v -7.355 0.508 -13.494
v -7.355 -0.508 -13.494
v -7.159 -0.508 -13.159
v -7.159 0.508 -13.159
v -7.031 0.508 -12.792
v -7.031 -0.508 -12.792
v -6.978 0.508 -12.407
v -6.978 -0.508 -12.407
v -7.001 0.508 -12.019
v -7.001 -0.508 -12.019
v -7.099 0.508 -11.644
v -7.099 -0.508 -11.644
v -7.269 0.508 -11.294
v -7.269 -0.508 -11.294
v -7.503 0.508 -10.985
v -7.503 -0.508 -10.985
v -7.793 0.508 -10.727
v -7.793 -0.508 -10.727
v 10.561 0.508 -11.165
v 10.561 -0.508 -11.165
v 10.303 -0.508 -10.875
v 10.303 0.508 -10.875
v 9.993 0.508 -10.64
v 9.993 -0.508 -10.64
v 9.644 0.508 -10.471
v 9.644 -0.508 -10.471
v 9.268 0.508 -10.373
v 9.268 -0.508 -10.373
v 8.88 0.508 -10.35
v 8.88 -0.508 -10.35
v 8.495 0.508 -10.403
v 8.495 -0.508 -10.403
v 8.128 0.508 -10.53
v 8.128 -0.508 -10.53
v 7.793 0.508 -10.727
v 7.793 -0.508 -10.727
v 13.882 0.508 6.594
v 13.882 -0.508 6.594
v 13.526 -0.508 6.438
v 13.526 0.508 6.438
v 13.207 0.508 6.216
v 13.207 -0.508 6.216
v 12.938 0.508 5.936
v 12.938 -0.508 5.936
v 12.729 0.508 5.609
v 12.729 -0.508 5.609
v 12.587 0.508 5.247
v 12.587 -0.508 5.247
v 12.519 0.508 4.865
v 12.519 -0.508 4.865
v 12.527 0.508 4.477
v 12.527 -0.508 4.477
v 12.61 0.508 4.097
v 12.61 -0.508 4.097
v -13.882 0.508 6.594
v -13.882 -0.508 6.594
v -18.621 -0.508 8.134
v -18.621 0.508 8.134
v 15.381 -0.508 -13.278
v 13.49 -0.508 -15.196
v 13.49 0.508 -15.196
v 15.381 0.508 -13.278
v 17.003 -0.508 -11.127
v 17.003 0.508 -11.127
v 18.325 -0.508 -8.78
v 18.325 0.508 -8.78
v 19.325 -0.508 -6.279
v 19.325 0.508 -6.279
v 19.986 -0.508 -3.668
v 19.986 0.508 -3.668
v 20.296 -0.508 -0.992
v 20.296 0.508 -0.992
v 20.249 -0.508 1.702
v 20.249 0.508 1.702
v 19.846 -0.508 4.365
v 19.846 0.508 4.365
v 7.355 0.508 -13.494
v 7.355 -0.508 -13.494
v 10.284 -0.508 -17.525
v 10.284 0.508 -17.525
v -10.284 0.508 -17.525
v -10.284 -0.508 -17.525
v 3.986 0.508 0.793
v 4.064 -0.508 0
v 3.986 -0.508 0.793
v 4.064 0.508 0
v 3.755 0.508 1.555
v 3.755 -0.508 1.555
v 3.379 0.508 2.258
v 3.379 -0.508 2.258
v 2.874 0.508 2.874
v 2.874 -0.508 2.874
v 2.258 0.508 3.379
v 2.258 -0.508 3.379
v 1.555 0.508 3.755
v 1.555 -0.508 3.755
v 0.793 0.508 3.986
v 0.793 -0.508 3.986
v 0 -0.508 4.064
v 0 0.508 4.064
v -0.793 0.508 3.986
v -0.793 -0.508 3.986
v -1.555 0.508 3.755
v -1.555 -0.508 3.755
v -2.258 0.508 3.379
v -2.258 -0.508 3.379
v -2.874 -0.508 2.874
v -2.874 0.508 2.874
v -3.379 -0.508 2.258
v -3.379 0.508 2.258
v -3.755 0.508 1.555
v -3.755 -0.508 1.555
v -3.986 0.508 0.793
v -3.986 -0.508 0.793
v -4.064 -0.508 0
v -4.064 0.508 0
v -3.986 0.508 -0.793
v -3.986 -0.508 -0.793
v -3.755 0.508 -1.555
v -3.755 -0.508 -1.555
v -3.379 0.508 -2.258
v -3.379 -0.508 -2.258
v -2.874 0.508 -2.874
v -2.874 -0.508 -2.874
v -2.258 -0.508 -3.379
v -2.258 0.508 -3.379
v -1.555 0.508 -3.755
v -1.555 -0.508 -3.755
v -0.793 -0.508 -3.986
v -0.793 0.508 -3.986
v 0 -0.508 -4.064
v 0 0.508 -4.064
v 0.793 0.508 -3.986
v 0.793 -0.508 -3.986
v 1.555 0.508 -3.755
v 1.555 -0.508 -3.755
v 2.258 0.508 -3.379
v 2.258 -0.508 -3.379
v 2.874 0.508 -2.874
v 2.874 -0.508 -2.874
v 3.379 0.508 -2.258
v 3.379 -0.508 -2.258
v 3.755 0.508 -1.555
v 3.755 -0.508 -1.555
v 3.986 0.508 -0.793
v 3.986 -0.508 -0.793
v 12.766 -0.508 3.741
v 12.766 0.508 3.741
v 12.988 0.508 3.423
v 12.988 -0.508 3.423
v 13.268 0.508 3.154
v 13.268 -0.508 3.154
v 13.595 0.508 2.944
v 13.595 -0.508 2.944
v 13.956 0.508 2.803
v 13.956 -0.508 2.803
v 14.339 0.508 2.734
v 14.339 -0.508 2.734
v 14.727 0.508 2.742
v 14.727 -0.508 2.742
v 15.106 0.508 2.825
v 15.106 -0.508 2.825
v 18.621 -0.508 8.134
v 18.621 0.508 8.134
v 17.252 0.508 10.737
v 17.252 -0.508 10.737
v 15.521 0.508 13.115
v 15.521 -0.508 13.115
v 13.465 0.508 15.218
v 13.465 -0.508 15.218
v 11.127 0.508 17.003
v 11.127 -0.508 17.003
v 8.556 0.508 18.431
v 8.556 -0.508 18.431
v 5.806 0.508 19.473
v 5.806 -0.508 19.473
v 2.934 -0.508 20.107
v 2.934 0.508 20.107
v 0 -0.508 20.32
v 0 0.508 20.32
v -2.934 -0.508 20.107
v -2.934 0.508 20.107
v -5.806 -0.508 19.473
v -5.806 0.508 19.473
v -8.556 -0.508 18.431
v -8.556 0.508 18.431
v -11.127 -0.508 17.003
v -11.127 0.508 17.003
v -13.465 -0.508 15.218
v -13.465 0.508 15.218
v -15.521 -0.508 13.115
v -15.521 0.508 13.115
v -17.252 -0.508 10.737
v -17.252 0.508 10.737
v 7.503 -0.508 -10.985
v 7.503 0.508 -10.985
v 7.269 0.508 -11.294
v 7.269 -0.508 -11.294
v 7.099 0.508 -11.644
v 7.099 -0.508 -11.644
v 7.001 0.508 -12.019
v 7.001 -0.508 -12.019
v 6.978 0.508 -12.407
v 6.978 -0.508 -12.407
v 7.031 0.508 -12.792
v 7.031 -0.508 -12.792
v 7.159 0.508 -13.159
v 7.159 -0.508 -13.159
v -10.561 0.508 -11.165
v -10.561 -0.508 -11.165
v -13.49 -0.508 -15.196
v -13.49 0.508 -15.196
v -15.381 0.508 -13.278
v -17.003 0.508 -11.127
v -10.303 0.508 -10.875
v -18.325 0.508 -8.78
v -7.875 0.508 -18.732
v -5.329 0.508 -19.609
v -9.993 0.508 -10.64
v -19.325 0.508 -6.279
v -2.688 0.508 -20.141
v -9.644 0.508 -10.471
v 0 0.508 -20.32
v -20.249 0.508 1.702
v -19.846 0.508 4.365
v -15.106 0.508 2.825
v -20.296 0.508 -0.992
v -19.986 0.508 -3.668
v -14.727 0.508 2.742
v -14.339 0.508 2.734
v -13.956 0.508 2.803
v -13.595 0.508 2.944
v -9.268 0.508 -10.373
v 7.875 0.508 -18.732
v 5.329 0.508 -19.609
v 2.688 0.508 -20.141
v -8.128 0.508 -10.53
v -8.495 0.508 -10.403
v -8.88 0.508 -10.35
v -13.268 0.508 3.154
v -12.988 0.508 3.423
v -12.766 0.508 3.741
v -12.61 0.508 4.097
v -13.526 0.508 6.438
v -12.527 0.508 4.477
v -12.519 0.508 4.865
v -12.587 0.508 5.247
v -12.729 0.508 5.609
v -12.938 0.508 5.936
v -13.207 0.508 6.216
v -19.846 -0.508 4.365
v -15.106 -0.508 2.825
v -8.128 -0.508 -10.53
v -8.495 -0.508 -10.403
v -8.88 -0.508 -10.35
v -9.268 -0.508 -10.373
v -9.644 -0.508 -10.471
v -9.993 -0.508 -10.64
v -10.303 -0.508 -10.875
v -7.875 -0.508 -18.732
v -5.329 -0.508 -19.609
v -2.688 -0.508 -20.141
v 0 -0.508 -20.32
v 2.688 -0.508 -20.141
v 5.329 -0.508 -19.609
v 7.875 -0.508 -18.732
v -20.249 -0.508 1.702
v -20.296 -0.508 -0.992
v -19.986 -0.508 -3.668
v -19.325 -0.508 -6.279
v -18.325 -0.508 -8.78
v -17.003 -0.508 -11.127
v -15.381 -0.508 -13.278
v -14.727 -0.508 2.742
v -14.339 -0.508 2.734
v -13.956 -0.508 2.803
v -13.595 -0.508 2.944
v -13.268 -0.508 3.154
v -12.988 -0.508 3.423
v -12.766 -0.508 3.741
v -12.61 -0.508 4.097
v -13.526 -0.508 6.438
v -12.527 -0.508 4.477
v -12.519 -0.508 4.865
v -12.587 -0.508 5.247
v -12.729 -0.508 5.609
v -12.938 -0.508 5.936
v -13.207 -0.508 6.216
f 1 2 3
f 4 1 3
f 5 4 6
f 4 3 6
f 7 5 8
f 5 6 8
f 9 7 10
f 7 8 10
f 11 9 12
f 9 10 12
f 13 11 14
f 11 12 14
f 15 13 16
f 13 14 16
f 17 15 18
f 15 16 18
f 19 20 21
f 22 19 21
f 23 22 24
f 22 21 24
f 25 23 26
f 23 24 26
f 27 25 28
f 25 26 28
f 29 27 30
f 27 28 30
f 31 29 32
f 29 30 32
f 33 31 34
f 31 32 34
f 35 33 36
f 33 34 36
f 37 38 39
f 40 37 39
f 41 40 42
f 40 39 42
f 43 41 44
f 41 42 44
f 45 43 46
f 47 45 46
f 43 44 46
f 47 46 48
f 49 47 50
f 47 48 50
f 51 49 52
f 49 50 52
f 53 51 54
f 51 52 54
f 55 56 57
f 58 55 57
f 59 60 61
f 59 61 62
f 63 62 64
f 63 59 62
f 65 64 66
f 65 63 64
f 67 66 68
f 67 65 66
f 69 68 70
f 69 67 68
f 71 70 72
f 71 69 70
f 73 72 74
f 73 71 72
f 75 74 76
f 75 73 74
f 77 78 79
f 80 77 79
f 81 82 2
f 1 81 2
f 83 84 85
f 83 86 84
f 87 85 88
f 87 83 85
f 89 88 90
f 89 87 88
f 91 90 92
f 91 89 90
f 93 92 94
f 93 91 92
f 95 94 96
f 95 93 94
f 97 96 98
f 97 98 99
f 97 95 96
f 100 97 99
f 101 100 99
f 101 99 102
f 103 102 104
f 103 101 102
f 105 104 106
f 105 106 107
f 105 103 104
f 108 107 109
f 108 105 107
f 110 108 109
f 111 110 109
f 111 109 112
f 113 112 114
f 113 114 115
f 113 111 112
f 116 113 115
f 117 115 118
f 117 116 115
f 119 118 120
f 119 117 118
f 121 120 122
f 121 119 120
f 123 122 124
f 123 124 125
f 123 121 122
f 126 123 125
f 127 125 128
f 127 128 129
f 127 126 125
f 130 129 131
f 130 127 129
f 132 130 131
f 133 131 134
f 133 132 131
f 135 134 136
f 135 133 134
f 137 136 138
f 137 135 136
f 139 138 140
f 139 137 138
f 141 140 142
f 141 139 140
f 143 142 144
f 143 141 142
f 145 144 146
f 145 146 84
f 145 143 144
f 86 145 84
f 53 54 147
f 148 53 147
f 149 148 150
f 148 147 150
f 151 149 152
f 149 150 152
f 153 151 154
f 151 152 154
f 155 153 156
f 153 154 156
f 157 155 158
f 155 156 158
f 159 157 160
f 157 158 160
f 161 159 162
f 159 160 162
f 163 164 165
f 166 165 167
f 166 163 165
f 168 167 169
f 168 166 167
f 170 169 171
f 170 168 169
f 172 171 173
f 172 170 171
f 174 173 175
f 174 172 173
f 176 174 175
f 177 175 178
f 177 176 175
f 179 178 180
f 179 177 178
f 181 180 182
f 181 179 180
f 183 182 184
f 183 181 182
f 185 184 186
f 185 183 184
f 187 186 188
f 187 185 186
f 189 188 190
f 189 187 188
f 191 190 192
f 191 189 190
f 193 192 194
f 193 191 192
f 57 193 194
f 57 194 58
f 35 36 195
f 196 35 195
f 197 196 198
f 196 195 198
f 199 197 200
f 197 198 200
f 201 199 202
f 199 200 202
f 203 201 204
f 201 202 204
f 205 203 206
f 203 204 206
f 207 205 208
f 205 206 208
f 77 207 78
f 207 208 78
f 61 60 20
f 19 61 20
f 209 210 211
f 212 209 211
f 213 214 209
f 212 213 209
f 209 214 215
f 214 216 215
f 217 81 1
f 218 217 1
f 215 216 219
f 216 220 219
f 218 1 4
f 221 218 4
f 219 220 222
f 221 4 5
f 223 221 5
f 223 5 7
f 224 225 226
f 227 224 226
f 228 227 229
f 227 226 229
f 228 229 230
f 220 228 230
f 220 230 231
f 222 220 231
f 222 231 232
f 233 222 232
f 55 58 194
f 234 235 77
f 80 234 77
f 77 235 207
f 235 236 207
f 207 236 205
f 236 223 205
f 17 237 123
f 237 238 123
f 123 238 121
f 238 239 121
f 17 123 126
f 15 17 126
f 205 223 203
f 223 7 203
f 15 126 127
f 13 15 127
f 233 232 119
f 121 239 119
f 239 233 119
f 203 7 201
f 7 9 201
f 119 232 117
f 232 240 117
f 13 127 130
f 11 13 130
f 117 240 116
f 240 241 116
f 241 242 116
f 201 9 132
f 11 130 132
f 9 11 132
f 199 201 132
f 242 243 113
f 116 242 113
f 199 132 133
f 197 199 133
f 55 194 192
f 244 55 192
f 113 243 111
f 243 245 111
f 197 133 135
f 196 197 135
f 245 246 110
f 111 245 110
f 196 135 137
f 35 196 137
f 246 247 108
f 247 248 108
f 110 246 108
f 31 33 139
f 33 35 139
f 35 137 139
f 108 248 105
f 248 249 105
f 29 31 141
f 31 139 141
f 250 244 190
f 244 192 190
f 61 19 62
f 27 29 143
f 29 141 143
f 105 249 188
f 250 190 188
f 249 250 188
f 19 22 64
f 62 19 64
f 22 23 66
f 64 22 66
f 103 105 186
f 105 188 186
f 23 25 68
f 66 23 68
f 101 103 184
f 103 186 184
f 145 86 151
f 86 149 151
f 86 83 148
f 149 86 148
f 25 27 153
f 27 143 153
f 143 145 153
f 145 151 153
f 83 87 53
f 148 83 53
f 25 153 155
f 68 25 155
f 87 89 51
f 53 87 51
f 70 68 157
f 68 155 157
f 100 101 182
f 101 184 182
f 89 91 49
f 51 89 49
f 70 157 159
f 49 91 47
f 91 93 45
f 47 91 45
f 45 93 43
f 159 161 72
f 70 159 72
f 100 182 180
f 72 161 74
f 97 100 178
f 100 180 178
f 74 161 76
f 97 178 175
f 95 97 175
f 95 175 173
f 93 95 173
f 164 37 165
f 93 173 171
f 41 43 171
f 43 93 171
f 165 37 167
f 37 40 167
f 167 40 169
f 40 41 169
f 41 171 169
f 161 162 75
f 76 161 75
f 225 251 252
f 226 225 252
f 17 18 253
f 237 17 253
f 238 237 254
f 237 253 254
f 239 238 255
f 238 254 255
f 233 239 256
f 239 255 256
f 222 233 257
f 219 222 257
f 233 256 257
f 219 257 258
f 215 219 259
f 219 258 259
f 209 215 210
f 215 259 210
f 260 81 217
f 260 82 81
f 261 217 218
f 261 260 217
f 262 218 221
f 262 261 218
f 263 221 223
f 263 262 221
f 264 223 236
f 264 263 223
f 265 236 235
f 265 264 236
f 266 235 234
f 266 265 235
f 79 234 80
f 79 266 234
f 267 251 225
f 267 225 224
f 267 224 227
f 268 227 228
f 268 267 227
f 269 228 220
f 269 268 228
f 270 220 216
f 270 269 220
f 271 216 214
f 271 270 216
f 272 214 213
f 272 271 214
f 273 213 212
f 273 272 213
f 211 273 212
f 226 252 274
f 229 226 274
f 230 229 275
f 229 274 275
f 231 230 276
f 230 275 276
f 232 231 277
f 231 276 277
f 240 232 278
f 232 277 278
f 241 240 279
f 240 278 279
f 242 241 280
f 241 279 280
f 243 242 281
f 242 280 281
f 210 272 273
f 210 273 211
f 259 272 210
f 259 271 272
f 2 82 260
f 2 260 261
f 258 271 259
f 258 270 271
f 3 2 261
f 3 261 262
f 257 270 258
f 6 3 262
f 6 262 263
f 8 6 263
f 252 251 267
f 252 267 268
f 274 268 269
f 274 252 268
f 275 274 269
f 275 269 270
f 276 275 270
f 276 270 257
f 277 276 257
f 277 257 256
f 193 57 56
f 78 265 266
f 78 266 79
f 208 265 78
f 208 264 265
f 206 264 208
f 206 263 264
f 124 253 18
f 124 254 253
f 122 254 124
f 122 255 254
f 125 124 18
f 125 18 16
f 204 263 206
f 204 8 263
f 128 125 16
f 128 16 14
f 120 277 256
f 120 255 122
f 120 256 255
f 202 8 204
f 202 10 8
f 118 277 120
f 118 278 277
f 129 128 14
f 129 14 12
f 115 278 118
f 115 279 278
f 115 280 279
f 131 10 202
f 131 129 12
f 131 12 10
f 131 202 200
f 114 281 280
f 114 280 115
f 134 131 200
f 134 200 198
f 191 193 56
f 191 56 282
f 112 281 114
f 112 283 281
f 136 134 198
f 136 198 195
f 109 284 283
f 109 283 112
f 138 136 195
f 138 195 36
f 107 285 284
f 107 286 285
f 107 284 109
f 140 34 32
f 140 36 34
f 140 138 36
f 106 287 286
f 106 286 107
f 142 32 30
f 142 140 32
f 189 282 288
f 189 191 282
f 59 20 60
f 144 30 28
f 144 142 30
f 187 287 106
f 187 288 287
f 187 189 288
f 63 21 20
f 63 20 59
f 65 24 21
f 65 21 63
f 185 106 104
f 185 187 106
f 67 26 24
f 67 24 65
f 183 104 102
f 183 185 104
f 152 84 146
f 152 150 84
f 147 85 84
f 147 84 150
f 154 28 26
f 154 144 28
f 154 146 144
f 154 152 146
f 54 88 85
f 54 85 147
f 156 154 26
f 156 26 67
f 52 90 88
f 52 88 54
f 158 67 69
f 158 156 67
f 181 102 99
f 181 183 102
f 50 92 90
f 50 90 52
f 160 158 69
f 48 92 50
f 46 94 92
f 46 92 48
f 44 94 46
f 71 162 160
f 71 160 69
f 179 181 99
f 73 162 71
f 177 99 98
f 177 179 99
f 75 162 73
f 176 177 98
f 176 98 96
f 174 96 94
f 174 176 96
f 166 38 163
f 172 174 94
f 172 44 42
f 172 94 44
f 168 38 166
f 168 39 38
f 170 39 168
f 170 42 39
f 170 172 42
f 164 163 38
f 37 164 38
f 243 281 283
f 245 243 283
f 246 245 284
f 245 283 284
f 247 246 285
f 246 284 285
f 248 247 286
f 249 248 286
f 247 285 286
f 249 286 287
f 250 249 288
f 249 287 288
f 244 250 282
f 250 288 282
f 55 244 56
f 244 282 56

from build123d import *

# Parameters (mm, degrees)
F0_R     = 20.32
F0_R_2   = 4.064
F1_DEPTH = 0.508
F3_DEPTH = 25.4


with BuildPart() as f1:
    # F0 (on Front) → F1 (new body, symmetric)
    with BuildSketch(Plane.XZ):
        Circle(F0_R)
        Circle(F0_R_2, mode=Mode.SUBTRACT)
    extrude(amount=F1_DEPTH, both=True)

    # F2 (on face) → F3 (cut)
    with BuildSketch(Plane.XZ.offset(0.508)):
        with BuildLine():
            Line((18.6211682286, 8.133541283), (13.8818768391, 6.5936521644))
            ThreePointArc((13.8818768391, 6.5936521644), (12.7288391826, 5.6088649724), (12.6098681383, 4.097194525))
            ThreePointArc((12.6098681383, 4.097194525), (13.5946553303, 2.9441568686), (15.1063257776, 2.8251858242))
            Line((15.1063257776, 2.8251858242), (19.8456171671, 4.3650749428))
            ThreePointArc((19.8456171671, 4.3650749428), (19.3254684111, 6.2792253257), (18.6211682286, 8.133541283))
        make_face()
        with BuildLine():
            ThreePointArc((10.284065937, -17.5254211876), (11.9437963266, -16.4392253257), (13.4897148755, -15.1963809039))
            Line((13.4897148755, -15.1963809039), (10.5606717142, -11.1648988524))
            ThreePointArc((10.5606717142, -11.1648988524), (9.2677752071, -10.3726108539), (7.7933271031, -10.726594525))
            ThreePointArc((7.7933271031, -10.726594525), (7.0010391046, -12.0194910321), (7.3550227757, -13.4939391361))
            Line((7.3550227757, -13.4939391361), (10.284065937, -17.5254211876))
        make_face()
        with BuildLine():
            Line((-10.5606717142, -11.1648988524), (-13.4897148755, -15.1963809039))
            ThreePointArc((-13.4897148755, -15.1963809039), (-11.9437963266, -16.4392253257), (-10.284065937, -17.5254211876))
            Line((-10.284065937, -17.5254211876), (-7.3550227757, -13.4939391361))
            ThreePointArc((-7.3550227757, -13.4939391361), (-7.0010391046, -12.0194910321), (-7.7933271031, -10.726594525))
            ThreePointArc((-7.7933271031, -10.726594525), (-9.2677752071, -10.3726108539), (-10.5606717142, -11.1648988524))
        make_face()
        with BuildLine():
            Line((-13.8818768391, 6.5936521644), (-18.6211682286, 8.133541283))
            ThreePointArc((-18.6211682286, 8.133541283), (-19.3254684111, 6.2792253257), (-19.8456171671, 4.3650749428))
            Line((-19.8456171671, 4.3650749428), (-15.1063257776, 2.8251858242))
            ThreePointArc((-15.1063257776, 2.8251858242), (-13.5946553303, 2.9441568686), (-12.6098681383, 4.097194525))
            ThreePointArc((-12.6098681383, 4.097194525), (-12.7288391826, 5.6088649724), (-13.8818768391, 6.5936521644))
        make_face()
    extrude(amount=-F3_DEPTH, mode=Mode.SUBTRACT)


solid = f1.part
